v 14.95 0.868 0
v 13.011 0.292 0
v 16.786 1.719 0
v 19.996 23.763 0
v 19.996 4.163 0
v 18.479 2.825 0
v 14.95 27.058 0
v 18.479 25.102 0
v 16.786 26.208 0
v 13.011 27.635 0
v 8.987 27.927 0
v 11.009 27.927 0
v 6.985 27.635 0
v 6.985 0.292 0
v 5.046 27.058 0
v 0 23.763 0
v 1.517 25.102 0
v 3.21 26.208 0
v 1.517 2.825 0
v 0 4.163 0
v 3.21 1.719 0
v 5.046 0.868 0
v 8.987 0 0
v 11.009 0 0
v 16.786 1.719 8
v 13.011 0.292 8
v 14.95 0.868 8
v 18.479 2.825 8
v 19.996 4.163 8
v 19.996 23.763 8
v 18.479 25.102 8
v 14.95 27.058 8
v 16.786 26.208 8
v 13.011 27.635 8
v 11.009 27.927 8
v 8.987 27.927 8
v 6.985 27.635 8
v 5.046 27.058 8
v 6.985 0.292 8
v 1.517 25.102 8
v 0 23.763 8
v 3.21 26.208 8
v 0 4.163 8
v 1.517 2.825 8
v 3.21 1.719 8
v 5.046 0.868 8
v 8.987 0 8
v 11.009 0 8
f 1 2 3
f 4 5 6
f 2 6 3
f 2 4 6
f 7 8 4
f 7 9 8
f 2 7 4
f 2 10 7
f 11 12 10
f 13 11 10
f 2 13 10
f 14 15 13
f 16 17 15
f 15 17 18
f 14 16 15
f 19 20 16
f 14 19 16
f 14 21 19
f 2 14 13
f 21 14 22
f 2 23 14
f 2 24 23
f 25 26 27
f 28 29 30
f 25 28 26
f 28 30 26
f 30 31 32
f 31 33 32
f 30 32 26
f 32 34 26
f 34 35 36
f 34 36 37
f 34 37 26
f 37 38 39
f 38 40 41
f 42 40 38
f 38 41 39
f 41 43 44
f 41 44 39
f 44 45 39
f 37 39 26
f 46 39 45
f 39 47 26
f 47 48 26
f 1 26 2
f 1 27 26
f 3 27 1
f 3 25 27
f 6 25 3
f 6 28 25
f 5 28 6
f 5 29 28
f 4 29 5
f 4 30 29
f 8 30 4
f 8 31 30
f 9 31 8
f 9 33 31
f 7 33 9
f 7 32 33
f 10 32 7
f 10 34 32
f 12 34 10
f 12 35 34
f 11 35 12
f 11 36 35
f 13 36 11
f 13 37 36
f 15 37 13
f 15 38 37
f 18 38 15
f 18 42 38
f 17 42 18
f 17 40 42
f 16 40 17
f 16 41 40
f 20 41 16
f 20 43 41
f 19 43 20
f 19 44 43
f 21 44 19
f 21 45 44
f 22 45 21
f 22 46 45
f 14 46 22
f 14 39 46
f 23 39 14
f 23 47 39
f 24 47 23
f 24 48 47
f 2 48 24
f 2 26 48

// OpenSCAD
$fn = 32;

// ----------------------------------------------------------------------
// Eccentric disc: double_d, 8 mm thick
// ----------------------------------------------------------------------

// --- parameters (mm) ---
profile_height = 8;       // extrusion height
profile_points = 24;      // points of the closed outline

profile = [[19.996, 23.763], [18.479, 25.102], [16.786, 26.208], [14.95, 27.058], [13.011, 27.635], [11.009, 27.927], [8.987, 27.927], [6.985, 27.635], [5.046, 27.058], [3.21, 26.208], [1.517, 25.102], [0, 23.763], [0, 4.163], [1.517, 2.825], [3.21, 1.719], [5.046, 0.868], [6.985, 0.292], [8.987, 0], [11.009, 0], [13.011, 0.292], [14.95, 0.868], [16.786, 1.719], [18.479, 2.825], [19.996, 4.163]];  // single closed polygon, 24 points, counter clockwise

// --- the one profile operation ---
linear_extrude(height = profile_height) polygon(points = profile);
